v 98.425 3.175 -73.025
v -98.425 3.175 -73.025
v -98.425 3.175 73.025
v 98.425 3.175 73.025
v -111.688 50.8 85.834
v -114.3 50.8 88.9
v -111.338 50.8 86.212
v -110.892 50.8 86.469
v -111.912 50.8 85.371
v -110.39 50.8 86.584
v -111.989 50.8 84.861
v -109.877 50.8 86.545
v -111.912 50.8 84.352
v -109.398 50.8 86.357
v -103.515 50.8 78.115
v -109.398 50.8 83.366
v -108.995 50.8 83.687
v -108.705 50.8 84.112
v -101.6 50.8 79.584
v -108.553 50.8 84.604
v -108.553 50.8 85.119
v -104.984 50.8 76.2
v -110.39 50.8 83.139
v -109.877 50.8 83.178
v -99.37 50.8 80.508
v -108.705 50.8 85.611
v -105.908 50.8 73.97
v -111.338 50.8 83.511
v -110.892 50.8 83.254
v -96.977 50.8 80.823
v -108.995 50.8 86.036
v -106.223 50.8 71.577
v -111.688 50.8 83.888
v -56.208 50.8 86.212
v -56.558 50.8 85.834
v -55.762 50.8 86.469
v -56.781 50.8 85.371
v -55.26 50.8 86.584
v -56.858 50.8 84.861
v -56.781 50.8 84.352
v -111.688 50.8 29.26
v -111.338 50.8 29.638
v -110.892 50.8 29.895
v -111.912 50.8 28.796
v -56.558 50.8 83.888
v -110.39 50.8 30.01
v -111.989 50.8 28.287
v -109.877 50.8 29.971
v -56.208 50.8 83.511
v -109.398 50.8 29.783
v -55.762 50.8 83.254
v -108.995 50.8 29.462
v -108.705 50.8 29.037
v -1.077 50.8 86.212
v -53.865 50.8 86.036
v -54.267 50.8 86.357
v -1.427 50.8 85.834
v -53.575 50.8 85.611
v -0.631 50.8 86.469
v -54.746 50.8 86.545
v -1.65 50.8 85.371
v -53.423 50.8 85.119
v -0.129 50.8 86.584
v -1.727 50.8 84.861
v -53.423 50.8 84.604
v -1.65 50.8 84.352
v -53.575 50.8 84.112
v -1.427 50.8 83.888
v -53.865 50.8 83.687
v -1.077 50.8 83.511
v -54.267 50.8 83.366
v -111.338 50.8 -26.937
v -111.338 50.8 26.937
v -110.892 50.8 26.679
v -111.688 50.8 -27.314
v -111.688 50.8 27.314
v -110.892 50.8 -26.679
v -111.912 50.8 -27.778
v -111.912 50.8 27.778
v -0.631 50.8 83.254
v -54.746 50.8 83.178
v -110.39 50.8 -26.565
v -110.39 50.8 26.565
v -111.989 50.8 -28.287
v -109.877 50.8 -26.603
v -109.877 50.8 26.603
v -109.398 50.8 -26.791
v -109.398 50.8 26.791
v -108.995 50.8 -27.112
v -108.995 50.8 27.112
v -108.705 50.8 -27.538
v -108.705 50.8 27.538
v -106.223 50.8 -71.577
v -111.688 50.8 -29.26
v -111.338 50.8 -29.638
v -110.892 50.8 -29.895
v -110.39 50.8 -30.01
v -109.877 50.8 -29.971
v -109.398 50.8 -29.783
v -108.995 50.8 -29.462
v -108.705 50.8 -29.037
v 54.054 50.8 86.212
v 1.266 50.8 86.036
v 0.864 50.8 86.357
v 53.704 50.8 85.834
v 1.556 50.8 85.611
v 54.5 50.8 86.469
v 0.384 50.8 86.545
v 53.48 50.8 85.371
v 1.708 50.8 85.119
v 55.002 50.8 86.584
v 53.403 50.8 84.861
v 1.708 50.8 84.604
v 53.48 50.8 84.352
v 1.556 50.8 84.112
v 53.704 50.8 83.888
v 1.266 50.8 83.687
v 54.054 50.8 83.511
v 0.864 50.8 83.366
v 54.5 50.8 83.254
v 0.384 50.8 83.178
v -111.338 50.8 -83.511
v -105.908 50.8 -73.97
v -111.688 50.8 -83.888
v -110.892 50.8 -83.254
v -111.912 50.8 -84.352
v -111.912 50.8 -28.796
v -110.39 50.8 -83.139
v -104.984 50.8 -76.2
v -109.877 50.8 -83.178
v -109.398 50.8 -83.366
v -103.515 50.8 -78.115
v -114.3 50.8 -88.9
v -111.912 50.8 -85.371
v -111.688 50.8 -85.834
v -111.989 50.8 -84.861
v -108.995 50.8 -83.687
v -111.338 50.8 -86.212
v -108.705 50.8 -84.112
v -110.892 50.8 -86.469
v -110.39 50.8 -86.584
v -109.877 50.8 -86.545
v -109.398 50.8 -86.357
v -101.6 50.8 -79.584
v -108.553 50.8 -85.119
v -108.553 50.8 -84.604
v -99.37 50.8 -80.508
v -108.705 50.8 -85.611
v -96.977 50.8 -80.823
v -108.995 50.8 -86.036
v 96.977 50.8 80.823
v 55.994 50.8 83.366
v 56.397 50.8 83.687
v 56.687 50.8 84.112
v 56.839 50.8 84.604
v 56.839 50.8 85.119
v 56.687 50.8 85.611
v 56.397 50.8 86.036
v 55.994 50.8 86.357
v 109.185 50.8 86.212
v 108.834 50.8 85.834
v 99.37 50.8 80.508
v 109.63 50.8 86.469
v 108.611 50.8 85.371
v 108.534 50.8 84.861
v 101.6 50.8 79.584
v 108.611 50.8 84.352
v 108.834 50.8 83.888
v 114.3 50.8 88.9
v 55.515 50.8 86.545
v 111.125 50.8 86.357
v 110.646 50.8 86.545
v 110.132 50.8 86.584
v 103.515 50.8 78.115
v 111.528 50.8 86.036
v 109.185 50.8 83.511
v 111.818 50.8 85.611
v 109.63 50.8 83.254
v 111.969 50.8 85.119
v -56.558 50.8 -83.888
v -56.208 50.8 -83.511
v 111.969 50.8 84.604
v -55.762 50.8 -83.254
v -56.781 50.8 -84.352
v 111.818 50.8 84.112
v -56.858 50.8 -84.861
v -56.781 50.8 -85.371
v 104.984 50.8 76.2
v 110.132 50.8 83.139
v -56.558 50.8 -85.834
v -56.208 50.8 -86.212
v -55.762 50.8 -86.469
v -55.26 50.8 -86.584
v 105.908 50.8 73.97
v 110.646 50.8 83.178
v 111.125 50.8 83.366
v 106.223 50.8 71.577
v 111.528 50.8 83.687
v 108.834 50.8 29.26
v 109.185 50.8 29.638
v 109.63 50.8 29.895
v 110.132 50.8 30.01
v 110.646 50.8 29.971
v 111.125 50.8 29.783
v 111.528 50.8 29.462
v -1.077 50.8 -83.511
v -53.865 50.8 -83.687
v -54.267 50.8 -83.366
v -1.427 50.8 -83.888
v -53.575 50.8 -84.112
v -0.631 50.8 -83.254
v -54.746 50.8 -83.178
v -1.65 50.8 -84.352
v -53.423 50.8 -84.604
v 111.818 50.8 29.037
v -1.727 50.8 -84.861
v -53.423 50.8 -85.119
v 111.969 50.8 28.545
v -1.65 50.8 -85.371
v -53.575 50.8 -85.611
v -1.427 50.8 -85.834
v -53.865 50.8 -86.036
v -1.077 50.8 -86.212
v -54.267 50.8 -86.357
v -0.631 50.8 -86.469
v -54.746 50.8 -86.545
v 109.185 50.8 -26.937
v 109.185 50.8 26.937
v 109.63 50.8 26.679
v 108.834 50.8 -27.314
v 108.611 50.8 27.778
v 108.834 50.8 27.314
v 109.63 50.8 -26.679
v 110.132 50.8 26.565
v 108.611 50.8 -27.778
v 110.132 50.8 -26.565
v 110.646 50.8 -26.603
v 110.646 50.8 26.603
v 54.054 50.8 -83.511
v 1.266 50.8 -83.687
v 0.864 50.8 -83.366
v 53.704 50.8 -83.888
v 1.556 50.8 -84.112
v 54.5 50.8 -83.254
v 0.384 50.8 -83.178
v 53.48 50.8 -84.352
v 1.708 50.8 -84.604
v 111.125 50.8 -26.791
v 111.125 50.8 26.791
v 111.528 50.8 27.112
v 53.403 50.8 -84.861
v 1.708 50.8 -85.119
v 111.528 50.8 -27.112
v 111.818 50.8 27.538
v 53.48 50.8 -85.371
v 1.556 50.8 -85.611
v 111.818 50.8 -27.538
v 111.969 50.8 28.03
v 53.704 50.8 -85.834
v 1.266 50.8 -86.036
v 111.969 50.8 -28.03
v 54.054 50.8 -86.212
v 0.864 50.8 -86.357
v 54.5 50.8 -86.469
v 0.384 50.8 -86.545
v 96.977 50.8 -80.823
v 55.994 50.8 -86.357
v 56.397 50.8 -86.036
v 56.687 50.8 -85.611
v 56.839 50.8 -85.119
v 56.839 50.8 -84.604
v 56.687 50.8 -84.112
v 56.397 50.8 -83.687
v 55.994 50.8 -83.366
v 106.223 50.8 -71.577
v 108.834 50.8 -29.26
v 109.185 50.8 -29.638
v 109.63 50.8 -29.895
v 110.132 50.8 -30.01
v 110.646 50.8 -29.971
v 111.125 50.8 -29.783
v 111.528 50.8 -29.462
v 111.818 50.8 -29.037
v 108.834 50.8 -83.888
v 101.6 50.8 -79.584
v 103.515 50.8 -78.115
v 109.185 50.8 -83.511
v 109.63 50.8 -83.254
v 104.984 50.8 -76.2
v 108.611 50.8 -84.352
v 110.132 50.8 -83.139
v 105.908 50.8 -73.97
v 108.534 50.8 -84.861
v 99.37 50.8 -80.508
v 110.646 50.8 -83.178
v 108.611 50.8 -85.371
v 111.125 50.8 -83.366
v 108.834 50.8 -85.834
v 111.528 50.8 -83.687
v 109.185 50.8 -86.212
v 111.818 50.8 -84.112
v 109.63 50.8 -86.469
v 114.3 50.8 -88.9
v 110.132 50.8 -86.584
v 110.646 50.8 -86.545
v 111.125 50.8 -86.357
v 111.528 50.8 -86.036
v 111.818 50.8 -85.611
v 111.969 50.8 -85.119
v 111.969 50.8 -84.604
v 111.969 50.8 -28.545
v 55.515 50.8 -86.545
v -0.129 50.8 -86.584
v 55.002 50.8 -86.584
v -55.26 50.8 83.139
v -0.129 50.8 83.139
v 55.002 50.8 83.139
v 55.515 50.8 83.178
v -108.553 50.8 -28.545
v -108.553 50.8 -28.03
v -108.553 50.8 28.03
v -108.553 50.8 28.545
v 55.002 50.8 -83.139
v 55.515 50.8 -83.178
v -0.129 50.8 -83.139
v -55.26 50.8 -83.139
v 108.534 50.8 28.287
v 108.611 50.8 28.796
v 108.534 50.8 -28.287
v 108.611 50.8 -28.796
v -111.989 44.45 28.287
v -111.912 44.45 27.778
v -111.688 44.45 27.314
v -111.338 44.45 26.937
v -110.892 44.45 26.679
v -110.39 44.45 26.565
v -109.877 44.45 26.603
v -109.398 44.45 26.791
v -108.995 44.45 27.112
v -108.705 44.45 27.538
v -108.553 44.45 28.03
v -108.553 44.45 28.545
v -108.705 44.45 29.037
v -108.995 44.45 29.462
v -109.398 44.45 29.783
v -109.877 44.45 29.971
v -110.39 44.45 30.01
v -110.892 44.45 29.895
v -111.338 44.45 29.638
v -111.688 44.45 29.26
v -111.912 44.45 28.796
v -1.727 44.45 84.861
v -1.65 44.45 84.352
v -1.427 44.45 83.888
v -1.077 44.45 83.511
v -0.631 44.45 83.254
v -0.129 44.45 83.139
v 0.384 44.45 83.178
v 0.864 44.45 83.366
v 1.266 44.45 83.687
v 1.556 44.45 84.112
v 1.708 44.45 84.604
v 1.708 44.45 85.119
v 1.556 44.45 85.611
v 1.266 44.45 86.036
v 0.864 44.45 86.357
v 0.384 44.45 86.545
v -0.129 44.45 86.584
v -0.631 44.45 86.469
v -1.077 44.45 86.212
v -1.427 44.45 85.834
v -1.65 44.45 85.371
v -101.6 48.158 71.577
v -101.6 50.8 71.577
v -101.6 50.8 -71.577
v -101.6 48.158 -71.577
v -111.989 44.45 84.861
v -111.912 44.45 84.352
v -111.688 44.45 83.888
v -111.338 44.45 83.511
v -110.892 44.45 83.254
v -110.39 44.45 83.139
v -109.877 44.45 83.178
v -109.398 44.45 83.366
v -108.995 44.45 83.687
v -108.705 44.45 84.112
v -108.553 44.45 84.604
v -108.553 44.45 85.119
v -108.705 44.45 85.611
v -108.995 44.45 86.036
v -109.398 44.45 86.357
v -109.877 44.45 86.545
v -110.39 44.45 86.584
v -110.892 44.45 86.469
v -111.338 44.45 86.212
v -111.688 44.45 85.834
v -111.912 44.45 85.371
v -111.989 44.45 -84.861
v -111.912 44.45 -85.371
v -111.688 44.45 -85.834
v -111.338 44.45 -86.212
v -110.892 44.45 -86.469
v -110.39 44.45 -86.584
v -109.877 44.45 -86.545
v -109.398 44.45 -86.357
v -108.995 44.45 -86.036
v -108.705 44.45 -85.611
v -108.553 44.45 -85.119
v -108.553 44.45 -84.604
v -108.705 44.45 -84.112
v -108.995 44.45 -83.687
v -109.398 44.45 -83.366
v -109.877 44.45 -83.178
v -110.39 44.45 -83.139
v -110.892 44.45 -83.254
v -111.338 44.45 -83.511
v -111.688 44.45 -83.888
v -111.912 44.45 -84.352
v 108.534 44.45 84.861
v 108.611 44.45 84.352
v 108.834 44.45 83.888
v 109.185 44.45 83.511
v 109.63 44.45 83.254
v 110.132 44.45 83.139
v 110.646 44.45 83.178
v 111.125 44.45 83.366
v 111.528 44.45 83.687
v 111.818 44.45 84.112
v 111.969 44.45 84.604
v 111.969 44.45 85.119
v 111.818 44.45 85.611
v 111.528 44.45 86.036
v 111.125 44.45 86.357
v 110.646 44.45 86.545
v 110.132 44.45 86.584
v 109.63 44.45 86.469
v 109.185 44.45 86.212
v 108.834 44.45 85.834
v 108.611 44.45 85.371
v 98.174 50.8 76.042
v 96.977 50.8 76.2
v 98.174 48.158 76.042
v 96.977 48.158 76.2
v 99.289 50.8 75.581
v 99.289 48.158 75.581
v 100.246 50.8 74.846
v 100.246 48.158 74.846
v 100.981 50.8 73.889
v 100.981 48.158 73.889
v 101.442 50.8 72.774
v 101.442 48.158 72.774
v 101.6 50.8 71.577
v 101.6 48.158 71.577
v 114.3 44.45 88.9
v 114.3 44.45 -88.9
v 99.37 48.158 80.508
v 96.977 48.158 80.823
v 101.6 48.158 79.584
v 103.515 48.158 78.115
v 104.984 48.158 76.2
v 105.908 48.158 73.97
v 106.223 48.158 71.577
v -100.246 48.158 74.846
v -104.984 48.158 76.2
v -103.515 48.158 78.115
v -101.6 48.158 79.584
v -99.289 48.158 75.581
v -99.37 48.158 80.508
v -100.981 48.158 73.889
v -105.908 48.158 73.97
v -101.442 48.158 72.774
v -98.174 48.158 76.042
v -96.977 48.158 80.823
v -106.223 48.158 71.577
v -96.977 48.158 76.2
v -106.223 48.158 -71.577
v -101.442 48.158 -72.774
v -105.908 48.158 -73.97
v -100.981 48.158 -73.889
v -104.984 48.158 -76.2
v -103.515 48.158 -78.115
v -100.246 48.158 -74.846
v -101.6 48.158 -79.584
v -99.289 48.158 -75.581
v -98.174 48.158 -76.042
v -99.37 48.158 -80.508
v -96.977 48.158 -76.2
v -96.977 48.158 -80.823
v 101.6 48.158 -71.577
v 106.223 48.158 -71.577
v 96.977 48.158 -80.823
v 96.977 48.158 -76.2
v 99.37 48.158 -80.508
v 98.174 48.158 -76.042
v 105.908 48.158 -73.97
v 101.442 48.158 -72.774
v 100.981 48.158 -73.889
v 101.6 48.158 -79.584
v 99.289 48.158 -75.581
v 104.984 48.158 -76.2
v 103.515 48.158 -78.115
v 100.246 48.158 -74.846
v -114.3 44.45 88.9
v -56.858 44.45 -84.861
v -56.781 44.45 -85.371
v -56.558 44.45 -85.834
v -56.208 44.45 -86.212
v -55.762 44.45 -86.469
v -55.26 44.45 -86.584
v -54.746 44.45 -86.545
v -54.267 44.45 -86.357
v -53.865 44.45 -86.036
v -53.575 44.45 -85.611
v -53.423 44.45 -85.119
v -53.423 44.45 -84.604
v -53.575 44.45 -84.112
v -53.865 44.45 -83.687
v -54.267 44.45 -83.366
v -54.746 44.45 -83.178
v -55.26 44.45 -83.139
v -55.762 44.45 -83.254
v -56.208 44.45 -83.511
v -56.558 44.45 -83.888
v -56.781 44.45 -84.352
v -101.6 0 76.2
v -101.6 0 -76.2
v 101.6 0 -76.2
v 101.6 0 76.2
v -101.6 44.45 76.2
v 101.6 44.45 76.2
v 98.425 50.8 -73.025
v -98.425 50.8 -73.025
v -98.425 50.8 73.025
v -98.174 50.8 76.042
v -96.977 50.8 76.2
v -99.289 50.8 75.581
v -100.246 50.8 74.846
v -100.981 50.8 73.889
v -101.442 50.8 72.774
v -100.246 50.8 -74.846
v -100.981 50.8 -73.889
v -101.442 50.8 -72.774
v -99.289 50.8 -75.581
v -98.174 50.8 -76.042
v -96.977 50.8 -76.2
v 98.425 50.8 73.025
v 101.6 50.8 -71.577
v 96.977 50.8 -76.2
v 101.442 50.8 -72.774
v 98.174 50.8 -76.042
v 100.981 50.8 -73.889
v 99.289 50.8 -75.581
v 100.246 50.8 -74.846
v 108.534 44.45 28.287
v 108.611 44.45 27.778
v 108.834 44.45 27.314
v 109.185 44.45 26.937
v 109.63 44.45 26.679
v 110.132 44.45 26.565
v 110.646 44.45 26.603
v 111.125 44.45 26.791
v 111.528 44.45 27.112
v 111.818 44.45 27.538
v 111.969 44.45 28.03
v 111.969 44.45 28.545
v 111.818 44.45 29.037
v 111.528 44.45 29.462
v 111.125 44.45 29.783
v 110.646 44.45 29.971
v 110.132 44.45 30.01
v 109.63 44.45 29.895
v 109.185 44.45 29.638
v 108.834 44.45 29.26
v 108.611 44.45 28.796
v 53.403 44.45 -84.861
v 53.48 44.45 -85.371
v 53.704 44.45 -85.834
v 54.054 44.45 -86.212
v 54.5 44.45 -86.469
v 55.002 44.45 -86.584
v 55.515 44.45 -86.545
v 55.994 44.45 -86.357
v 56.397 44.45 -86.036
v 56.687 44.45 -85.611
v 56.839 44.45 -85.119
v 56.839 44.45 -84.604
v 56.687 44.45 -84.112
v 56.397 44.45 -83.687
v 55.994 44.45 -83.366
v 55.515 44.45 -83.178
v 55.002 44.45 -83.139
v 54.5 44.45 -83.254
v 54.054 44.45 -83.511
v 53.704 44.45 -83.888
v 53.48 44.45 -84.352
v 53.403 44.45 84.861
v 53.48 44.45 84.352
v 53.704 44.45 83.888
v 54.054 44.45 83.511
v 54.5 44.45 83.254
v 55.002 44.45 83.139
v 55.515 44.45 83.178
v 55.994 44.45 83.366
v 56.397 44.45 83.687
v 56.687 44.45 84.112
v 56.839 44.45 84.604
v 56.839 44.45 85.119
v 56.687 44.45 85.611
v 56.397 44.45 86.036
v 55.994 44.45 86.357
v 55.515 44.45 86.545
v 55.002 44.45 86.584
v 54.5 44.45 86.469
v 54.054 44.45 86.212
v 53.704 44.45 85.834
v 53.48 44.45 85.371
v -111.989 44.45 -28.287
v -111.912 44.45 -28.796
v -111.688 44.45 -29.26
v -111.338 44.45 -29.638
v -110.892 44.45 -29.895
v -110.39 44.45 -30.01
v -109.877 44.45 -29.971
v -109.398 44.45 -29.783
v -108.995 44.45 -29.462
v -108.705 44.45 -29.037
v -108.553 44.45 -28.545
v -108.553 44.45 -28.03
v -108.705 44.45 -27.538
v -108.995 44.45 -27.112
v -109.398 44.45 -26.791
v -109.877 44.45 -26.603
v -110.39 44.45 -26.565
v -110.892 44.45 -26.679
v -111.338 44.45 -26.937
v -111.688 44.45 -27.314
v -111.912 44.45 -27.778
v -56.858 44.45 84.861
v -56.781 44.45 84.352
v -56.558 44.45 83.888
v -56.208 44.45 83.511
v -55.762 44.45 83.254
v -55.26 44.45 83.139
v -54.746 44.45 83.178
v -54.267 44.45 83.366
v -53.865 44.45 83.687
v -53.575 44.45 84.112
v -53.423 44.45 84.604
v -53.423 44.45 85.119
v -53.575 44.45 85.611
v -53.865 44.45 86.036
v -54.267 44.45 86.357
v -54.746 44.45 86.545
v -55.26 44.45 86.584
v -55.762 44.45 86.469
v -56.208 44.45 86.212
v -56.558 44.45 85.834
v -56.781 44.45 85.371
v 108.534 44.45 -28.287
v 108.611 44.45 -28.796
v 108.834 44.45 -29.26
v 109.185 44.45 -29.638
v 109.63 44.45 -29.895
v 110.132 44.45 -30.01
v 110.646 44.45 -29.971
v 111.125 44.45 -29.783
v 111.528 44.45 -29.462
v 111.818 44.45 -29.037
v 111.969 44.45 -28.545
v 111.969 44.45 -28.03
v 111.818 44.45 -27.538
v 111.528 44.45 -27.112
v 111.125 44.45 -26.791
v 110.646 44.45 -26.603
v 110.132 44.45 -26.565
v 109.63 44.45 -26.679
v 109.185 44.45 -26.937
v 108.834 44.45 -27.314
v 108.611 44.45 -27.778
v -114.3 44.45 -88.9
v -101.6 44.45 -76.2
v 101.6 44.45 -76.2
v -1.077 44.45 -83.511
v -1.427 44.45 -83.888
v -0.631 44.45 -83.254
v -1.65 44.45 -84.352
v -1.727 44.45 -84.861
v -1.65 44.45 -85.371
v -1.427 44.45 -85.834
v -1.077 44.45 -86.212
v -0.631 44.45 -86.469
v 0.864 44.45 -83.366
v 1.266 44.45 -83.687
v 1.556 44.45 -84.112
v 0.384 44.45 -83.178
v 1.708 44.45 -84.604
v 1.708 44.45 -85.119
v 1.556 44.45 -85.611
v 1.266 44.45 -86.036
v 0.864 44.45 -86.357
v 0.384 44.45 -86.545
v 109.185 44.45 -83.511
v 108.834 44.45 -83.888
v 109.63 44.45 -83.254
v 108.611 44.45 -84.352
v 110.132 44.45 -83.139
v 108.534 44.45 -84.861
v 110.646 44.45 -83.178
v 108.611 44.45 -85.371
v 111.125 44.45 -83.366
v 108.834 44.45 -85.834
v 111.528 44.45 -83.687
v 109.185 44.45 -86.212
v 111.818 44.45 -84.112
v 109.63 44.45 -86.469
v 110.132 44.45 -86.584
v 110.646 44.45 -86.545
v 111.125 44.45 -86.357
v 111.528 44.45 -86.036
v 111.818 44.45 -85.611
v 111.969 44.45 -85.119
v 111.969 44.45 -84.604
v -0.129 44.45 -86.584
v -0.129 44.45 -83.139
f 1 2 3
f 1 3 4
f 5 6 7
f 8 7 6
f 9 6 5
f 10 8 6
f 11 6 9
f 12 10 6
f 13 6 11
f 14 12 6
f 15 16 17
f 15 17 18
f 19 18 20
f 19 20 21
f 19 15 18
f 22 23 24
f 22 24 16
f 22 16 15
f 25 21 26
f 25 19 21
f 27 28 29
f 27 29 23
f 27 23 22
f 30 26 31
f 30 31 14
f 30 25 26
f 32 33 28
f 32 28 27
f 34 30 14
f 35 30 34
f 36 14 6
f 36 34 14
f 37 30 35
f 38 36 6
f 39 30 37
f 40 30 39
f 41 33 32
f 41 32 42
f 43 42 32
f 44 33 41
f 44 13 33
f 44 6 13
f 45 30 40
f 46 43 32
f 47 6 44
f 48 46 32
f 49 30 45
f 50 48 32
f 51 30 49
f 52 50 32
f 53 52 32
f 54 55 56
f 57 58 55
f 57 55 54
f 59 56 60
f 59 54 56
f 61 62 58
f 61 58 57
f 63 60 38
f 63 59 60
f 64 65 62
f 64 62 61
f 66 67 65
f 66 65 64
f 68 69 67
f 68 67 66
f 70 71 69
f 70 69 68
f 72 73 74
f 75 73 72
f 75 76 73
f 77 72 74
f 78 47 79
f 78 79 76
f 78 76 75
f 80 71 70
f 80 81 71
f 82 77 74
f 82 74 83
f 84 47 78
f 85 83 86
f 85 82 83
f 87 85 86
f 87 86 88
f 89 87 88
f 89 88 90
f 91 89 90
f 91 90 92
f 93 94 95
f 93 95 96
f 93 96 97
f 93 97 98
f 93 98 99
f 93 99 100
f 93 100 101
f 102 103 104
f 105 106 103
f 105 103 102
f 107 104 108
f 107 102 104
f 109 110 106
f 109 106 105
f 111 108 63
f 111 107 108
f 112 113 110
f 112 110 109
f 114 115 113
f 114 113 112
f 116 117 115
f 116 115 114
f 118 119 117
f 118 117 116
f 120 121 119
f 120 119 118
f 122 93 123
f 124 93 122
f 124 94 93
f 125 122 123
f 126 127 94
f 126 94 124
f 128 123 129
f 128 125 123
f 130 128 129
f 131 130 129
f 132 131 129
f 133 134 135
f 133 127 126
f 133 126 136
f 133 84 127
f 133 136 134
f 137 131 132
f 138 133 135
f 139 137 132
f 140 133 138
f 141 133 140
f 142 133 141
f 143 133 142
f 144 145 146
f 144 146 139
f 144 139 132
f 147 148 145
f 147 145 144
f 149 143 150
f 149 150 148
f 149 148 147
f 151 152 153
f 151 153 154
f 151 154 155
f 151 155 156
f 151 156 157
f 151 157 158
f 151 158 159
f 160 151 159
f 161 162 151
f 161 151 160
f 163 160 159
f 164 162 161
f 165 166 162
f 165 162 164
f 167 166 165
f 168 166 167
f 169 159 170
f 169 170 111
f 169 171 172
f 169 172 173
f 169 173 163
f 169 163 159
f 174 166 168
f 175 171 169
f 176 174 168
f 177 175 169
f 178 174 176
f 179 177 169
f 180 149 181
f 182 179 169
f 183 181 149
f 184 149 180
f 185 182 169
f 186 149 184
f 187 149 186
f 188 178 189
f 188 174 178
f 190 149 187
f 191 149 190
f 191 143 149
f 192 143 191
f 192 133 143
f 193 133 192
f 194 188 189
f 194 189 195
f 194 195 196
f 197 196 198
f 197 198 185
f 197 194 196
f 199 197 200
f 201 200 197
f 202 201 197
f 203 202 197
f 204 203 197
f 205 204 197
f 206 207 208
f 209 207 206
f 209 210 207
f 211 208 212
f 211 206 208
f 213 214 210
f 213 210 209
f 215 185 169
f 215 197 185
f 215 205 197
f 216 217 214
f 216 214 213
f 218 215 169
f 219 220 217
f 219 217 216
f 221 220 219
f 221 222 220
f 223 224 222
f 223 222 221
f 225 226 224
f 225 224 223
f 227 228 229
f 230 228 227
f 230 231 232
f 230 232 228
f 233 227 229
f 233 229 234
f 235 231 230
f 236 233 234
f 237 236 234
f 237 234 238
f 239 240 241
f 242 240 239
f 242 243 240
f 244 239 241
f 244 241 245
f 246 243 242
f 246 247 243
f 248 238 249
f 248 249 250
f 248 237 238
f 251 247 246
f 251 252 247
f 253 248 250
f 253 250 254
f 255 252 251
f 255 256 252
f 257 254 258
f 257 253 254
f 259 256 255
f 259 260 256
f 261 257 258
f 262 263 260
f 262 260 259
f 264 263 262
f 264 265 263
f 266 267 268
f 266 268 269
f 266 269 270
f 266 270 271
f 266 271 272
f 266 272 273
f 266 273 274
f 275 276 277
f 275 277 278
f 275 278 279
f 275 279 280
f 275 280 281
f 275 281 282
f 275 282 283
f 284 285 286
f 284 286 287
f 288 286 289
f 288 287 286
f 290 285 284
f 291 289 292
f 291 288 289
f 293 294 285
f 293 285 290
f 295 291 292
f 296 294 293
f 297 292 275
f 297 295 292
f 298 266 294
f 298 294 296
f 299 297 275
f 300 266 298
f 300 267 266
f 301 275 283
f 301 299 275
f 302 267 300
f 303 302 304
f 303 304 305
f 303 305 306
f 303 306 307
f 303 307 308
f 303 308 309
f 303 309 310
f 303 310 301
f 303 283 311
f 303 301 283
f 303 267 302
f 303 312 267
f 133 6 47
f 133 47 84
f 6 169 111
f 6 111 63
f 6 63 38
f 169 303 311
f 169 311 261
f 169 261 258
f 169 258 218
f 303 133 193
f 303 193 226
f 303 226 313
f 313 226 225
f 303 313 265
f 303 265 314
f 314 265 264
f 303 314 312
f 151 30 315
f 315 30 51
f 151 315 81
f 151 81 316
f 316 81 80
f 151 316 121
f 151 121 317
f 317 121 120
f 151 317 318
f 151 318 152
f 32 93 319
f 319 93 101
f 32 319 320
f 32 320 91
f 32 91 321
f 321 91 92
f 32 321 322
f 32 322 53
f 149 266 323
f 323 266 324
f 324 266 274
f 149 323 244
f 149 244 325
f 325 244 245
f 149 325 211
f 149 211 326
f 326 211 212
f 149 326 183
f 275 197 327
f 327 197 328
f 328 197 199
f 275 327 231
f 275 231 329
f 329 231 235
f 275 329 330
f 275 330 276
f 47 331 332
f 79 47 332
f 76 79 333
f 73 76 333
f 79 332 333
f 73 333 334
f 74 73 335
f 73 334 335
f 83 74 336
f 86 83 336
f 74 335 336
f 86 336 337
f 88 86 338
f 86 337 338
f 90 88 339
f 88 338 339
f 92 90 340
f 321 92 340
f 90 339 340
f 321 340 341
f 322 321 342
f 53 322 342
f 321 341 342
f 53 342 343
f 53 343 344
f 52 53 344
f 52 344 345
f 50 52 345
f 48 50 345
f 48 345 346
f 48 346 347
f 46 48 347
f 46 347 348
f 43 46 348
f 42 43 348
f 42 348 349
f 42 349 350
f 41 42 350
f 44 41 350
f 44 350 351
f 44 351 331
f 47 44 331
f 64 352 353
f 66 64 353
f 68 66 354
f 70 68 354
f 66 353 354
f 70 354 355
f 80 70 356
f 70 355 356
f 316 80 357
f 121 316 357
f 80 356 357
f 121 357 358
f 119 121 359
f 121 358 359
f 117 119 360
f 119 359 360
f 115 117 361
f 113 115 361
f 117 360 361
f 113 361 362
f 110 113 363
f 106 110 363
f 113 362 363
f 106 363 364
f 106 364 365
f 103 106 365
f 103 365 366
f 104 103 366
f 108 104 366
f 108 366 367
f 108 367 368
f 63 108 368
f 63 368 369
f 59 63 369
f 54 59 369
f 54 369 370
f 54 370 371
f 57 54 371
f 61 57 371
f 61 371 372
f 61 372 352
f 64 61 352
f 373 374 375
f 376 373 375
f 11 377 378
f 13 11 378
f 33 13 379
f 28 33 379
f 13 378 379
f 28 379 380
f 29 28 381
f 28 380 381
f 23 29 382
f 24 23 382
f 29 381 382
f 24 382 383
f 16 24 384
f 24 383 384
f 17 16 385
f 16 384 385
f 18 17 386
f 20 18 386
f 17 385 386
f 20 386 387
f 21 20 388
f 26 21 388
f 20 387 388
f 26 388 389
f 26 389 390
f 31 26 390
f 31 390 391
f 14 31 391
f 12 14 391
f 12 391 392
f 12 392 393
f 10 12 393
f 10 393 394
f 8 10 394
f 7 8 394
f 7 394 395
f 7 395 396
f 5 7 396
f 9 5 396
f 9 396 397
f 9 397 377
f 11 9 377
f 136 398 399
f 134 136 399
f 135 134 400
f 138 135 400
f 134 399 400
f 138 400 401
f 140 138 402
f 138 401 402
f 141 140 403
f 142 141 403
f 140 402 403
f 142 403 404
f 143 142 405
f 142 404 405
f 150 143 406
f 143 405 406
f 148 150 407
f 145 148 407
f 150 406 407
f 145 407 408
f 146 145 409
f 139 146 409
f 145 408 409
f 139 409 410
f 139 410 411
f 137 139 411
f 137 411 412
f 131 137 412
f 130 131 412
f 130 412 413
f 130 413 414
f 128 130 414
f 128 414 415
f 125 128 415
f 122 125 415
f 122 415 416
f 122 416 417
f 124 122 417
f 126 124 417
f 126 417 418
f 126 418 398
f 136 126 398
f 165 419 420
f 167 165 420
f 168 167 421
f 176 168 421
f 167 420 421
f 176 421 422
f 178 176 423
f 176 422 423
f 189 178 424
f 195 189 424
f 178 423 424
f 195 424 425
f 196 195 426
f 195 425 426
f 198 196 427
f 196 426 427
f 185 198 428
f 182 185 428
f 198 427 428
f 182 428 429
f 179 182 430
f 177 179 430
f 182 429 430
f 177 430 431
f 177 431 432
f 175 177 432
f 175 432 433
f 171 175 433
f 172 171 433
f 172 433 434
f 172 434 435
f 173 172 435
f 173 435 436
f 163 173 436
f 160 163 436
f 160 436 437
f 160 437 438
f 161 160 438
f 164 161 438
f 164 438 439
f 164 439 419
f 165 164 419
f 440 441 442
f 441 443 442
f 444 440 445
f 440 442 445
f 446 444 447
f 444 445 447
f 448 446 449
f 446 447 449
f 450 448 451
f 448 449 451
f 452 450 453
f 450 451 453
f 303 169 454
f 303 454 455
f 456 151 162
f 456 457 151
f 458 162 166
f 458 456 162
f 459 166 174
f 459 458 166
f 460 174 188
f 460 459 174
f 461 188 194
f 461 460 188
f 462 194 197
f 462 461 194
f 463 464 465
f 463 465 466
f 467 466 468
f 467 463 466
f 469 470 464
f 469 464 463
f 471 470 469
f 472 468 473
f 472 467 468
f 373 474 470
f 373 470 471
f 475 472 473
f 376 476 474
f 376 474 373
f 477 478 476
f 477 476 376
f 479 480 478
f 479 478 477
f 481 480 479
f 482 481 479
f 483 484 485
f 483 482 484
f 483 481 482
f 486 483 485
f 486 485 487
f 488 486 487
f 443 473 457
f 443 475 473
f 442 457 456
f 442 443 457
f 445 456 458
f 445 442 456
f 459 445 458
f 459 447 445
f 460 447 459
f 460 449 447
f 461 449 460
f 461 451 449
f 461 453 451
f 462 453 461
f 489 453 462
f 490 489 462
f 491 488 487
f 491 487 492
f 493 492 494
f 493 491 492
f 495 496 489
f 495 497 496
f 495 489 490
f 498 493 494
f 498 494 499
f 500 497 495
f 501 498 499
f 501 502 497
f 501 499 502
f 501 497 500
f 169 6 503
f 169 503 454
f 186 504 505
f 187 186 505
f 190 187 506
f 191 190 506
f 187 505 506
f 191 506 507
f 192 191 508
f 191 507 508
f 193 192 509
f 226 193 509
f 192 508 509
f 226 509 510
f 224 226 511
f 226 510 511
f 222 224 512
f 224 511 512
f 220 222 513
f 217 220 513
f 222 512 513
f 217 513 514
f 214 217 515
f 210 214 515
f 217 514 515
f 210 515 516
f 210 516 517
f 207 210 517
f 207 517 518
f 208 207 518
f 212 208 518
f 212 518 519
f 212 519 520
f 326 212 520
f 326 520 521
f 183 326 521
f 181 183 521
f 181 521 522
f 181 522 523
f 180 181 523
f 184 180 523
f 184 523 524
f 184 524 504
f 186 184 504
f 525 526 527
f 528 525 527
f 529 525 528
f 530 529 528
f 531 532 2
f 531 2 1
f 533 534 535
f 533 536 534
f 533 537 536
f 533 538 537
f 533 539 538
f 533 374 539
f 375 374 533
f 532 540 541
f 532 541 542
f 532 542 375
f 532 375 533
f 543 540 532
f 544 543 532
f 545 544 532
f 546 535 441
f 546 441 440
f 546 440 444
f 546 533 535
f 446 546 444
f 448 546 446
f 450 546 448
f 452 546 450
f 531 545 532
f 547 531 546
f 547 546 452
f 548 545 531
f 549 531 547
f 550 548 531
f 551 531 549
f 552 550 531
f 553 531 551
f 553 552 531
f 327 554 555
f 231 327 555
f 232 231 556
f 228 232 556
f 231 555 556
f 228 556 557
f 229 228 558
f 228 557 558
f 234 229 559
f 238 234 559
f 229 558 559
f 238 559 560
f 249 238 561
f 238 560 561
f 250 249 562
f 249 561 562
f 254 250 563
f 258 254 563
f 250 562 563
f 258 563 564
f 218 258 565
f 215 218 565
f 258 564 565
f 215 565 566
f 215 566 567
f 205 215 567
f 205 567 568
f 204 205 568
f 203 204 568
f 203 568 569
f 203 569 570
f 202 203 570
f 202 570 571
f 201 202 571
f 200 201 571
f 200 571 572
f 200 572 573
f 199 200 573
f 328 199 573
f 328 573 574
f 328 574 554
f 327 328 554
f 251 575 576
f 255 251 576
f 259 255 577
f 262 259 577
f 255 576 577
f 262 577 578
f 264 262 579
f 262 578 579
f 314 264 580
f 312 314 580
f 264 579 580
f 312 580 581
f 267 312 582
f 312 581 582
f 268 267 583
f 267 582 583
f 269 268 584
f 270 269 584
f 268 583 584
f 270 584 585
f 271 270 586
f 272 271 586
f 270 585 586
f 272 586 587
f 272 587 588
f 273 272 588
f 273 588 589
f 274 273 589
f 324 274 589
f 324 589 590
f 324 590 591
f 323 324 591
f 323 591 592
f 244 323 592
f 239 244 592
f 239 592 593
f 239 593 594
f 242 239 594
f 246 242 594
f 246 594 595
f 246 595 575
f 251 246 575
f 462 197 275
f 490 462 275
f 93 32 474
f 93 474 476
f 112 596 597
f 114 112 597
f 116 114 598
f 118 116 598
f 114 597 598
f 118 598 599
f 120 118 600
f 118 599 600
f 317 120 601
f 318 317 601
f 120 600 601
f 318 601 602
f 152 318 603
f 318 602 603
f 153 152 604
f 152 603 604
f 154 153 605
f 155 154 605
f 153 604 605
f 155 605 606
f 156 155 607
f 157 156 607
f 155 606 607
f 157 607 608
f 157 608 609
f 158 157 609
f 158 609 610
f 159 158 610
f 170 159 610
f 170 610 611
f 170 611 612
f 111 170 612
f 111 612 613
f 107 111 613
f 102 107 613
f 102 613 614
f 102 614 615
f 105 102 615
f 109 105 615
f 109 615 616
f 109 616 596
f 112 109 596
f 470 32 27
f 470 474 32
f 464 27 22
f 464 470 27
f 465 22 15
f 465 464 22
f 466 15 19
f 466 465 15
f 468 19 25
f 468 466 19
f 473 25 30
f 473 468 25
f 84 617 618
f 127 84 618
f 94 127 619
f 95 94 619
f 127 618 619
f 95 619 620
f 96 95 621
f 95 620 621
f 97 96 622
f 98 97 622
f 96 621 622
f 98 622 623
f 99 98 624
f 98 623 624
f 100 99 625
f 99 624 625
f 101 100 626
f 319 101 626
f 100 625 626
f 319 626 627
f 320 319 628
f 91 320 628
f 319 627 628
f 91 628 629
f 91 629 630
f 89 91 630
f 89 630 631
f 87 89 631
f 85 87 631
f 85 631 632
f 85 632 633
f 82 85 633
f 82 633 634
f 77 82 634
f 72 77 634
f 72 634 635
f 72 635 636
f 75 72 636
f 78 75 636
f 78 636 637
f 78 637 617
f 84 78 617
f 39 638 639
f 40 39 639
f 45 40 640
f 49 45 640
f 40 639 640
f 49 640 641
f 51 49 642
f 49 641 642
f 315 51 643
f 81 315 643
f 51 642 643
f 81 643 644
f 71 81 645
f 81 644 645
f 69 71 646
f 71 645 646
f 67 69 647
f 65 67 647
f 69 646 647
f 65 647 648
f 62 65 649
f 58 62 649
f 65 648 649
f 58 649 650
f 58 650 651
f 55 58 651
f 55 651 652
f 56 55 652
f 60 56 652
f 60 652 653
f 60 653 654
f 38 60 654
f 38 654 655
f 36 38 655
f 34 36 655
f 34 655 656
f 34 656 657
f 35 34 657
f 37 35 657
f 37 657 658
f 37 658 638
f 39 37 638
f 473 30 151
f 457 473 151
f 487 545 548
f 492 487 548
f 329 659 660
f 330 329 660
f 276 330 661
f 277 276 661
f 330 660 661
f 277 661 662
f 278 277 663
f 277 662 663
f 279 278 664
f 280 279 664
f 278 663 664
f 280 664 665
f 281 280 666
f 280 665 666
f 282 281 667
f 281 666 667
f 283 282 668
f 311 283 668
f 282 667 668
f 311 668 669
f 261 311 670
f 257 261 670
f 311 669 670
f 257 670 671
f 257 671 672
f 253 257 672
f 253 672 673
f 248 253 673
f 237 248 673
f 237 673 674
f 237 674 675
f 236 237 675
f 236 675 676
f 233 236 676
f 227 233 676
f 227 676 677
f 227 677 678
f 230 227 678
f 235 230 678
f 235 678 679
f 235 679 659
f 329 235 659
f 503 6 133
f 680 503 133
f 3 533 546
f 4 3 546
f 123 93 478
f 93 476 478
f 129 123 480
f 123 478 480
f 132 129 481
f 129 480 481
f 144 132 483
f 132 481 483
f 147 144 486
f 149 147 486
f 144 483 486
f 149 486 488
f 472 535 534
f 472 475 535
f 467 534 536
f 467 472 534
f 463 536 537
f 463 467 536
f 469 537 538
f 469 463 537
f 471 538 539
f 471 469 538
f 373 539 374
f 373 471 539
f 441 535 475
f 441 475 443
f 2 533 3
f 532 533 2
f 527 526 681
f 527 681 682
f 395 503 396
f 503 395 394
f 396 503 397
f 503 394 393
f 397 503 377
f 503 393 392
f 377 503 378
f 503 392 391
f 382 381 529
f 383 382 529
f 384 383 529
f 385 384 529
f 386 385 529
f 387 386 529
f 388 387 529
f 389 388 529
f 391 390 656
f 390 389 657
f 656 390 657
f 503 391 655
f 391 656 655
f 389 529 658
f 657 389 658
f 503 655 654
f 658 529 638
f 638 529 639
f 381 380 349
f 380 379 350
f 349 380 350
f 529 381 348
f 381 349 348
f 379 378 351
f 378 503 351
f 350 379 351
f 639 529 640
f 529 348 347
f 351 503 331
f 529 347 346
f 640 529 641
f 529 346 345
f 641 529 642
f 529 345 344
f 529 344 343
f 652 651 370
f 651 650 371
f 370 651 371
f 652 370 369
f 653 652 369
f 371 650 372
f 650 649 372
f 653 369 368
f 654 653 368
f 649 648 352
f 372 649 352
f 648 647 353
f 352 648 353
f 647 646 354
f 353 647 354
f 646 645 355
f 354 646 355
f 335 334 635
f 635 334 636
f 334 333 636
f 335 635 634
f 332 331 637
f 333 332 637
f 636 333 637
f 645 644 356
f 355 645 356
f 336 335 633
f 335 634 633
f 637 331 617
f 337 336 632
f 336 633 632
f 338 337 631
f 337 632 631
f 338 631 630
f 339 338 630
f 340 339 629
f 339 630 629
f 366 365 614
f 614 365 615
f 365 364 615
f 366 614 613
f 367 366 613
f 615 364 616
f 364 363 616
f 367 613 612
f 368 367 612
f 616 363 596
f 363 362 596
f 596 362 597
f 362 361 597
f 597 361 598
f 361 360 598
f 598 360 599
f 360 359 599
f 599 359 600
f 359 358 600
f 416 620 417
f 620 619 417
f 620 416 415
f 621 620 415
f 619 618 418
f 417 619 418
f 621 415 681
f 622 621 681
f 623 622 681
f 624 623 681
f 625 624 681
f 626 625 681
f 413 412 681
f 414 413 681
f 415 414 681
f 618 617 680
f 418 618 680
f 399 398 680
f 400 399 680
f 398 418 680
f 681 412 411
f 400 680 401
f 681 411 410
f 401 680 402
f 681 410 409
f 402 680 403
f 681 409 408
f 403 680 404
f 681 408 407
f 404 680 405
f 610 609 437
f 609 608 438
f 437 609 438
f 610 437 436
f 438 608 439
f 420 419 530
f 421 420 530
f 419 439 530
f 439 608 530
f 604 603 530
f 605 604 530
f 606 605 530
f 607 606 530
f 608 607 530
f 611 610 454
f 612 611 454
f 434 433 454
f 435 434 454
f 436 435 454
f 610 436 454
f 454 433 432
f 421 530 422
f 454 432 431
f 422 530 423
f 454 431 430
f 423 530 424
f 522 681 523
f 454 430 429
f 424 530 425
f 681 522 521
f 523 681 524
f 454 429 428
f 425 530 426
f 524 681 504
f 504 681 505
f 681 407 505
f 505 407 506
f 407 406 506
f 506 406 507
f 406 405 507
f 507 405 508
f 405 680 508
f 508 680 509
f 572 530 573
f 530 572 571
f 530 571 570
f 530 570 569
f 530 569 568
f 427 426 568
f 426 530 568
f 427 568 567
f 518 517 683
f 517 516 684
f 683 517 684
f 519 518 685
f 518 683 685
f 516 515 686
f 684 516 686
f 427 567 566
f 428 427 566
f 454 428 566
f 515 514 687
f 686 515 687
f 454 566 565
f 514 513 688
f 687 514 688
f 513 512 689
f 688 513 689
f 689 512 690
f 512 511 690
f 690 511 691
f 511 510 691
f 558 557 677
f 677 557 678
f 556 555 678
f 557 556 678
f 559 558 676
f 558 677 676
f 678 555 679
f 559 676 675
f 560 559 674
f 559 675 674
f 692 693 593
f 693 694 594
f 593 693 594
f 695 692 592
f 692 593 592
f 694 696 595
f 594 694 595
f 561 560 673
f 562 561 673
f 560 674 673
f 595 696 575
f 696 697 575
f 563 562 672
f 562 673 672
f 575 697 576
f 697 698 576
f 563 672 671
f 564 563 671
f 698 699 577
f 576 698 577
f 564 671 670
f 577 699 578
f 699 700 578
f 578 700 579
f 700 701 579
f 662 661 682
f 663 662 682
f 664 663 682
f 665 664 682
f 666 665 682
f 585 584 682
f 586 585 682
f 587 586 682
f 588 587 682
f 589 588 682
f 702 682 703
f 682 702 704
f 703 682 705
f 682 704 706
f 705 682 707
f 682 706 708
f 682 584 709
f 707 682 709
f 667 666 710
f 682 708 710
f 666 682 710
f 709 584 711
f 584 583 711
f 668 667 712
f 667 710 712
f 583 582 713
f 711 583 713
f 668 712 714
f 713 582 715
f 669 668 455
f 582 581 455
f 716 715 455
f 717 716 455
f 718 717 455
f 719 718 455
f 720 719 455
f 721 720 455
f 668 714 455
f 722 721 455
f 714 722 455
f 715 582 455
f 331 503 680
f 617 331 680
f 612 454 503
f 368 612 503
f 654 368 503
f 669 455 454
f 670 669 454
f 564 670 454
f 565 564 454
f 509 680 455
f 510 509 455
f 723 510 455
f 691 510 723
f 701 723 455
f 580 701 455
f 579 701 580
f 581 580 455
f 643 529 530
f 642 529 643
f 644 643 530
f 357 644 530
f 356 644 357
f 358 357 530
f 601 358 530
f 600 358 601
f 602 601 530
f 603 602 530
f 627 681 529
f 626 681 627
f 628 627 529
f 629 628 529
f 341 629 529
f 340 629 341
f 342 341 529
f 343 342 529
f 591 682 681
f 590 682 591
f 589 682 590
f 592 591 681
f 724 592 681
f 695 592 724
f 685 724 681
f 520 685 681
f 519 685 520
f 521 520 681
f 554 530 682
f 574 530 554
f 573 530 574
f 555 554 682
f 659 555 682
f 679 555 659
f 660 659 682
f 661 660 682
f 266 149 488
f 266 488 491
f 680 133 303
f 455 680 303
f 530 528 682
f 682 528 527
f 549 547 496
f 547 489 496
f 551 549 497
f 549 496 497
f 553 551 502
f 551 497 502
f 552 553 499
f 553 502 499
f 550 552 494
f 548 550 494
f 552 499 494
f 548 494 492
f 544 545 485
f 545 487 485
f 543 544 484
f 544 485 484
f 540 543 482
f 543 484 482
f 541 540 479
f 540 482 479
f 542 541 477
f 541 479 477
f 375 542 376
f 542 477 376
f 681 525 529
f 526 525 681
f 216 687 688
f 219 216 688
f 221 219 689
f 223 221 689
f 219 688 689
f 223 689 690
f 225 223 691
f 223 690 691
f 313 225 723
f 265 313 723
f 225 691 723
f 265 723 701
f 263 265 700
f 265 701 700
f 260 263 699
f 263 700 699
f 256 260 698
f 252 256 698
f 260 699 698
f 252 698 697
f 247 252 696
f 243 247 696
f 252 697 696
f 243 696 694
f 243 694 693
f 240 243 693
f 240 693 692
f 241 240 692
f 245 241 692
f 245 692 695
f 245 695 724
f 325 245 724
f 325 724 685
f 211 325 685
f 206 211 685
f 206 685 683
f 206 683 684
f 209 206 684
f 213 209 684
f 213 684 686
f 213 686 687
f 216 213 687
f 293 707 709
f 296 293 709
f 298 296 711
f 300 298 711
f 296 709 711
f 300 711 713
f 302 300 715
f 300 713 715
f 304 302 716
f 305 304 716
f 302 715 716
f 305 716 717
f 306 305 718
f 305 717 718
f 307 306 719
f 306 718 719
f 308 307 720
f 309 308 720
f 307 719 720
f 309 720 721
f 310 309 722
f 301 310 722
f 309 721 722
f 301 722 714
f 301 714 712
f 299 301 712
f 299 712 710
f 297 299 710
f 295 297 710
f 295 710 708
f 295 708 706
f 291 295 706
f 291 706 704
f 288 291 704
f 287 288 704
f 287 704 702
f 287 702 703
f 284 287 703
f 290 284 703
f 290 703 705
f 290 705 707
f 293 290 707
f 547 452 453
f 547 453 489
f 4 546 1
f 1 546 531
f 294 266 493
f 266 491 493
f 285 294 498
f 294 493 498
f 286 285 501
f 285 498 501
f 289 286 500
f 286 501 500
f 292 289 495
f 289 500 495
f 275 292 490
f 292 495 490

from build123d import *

# Parameters (mm, degrees)
SKETCH1_W             = 203.2
SKETCH1_H             = 152.4
BOSS_EXTRUDE1_DEPTH   = 50.8
SKETCH2_W             = 196.85
SKETCH2_H             = 146.05
CUT_EXTRUDE1_DEPTH    = 47.625
SKETCH4_W             = 228.6
SKETCH4_H             = 177.8
SKETCH4_W_2           = 203.2
SKETCH4_H_2           = 152.4
BOSS_EXTRUDE2_DEPTH   = 6.35
SKETCH7_W             = 212.4456
SKETCH7_H             = 161.6456
SKETCH7_W_2           = 203.2
SKETCH7_H_2           = 152.4
CUT_EXTRUDE2_DEPTH    = 2.6416
F_8_32_TAPPED_HOLE1_D = 3.4544
FILLET3_R             = 4.6228
FILLET4_R             = 9.2456


with BuildPart() as part:
    # Sketch1 → Boss-Extrude1 (new body)
    with BuildSketch(Plane(origin=(0, 0, 0), x_dir=(1, 0, 0), z_dir=(0, 1, 0))):
        Rectangle(SKETCH1_W, SKETCH1_H)
    extrude(amount=BOSS_EXTRUDE1_DEPTH)

    # Sketch2 → Cut-Extrude1 (cut)
    with BuildSketch(Plane(origin=(0, 50.8, 0), x_dir=(1, 0, 0), z_dir=(0, 1, 0))):
        Rectangle(SKETCH2_W, SKETCH2_H)
    extrude(amount=-CUT_EXTRUDE1_DEPTH, mode=Mode.SUBTRACT)

    # Sketch4 → Boss-Extrude2 (add)
    with BuildSketch(Plane(origin=(0, 50.8, 0), x_dir=(1, 0, 0), z_dir=(0, 1, 0))):
        Rectangle(SKETCH4_W, SKETCH4_H)
        Rectangle(SKETCH4_W_2, SKETCH4_H_2, mode=Mode.SUBTRACT)
    extrude(amount=-BOSS_EXTRUDE2_DEPTH)

    # Sketch7 → Cut-Extrude2 (cut)
    with BuildSketch(Plane(origin=(0, 50.8, 0), x_dir=(1, 0, 0), z_dir=(0, 1, 0))):
        Rectangle(SKETCH7_W, SKETCH7_H)
        Rectangle(SKETCH7_W_2, SKETCH7_H_2, mode=Mode.SUBTRACT)
    extrude(amount=-CUT_EXTRUDE2_DEPTH, mode=Mode.SUBTRACT)

    # #8-32 Tapped Hole1 (through all)
    with Locations(Plane(origin=(0, 50.8, 0), x_dir=(1, 0, 0), z_dir=(0, 1, 0))):
        with Locations((55.1307, 84.8614), (110.2614, 84.8614), (110.2614, 28.287133333), (0, 84.8614), (110.2614, -28.287133333), (110.2614, -84.8614), (55.1307, -84.8614), (0, -84.8614), (-55.1307, -84.8614), (-110.2614, -84.8614), (-110.2614, -28.287133333), (-110.2614, 28.287133333), (-110.2614, 84.8614), (-55.1307, 84.8614)):
            Hole(F_8_32_TAPPED_HOLE1_D / 2)

    # Fillet3
    fillet3_edges = [part.edges().sort_by_distance(p)[0] for p in [
        (-101.6, 49.4792, -76.2),
        (101.6, 49.4792, -76.2),
        (101.6, 49.4792, 76.2),
        (-101.6, 49.4792, 76.2),
    ]]
    fillet(fillet3_edges, radius=FILLET3_R)

    # Fillet4
    fillet4_edges = [part.edges().sort_by_distance(p)[0] for p in [
        (-106.2228, 49.4792, -80.8228),
        (106.2228, 49.4792, -80.8228),
        (106.2228, 49.4792, 80.8228),
        (-106.2228, 49.4792, 80.8228),
    ]]
    fillet(fillet4_edges, radius=FILLET4_R)


solid = part.part
